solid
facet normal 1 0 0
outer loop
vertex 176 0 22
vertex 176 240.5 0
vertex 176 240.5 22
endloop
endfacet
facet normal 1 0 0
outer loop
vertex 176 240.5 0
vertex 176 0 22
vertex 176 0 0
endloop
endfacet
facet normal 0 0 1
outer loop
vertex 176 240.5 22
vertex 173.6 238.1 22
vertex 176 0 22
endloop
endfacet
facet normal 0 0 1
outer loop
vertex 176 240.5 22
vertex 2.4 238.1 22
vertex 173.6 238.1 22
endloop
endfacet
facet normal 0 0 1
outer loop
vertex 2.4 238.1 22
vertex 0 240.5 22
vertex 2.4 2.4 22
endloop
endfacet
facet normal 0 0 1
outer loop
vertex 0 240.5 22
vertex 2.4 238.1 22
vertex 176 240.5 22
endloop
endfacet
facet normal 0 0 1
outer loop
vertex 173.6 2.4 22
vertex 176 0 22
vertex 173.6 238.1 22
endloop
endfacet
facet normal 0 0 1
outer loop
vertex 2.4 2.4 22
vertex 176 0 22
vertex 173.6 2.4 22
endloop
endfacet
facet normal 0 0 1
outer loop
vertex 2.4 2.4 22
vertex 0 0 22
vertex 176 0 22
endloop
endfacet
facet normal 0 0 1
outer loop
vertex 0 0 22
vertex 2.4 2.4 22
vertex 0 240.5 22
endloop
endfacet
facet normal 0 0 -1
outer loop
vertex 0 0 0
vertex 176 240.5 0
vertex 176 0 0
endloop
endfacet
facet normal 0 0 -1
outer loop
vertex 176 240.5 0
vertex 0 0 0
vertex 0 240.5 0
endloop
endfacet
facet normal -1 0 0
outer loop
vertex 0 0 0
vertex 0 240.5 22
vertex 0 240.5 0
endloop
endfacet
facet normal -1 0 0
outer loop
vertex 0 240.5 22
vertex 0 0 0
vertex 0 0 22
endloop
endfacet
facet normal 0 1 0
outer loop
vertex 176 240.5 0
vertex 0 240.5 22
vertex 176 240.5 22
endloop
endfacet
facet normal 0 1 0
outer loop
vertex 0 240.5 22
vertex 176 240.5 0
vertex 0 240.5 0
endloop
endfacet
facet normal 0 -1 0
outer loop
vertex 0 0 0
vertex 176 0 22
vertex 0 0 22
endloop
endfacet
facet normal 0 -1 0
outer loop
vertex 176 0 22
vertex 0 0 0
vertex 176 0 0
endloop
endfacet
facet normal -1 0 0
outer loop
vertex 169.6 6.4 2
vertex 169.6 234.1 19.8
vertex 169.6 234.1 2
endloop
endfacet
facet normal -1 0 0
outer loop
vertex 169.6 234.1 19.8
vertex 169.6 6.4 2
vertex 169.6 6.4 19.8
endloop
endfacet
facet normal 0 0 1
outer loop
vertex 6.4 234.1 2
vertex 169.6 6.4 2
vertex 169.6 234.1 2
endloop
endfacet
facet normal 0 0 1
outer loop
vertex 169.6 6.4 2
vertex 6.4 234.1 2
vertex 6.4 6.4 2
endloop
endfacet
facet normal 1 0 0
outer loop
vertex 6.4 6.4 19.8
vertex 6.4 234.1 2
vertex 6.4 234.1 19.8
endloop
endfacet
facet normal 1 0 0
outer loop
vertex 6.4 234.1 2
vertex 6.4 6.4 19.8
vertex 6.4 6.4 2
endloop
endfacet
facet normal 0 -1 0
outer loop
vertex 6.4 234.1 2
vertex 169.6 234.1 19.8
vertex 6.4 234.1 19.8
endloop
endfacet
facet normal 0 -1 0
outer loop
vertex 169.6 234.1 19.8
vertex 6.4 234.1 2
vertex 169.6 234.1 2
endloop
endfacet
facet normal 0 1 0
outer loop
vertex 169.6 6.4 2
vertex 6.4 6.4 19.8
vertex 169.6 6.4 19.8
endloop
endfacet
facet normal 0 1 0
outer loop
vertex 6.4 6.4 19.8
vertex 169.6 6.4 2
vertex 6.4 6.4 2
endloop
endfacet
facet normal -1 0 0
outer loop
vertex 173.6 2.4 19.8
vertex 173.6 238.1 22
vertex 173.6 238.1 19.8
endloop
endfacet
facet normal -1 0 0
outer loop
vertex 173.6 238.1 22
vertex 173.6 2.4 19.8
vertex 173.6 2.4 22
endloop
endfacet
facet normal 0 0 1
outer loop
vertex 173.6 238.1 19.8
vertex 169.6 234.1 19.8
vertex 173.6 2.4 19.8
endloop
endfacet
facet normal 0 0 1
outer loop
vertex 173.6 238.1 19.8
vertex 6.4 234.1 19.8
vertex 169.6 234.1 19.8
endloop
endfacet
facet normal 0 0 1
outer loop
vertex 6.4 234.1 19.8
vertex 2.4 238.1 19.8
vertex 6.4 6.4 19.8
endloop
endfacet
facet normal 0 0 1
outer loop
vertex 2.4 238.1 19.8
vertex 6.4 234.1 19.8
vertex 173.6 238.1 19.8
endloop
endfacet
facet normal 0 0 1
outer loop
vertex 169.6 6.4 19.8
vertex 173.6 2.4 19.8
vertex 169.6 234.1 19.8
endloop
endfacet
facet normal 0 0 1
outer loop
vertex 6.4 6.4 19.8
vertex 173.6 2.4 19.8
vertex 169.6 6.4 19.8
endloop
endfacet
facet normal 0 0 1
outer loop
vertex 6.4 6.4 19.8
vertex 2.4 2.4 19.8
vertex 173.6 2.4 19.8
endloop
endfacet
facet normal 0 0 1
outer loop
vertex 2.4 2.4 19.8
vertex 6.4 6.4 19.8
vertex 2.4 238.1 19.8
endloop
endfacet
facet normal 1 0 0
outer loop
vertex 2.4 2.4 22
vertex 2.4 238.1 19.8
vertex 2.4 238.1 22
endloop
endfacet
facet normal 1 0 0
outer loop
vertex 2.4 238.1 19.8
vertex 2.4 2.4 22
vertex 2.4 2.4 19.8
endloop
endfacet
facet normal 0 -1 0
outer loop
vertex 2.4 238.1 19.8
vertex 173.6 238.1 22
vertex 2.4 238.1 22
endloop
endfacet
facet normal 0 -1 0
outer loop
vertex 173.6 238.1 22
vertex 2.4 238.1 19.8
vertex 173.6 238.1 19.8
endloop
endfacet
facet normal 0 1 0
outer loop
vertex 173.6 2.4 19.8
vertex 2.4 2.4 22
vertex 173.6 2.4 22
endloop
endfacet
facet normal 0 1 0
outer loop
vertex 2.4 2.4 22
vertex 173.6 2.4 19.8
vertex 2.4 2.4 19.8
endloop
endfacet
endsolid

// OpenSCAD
// Four, split for a 153.36 x 77.76 x 165 mm resin plate.
// The tray is FDM. Every other part fits in 150.9 x 75.3 mm.
// Tiles drop into a 2.2 mm rabbet. Glue them. Do not screw them.
//
//   openscad -D 'part="tray"' -o tray.stl four.scad
//
W = 176.0;
H = 240.5;
tray_h = 22.0;
wall = 2.4;
tile_t = 2.2;
part = "tray"; // [tray, fader-1, fader-2, fader-3, fader-4, master, transport-l, transport-r, ear-l, screen, ear-r]

module tile(x0, y0, x1, y1) {
  translate([x0, y0, tray_h - tile_t]) cube([x1 - x0, y1 - y0, tile_t]);
}

module faders_12() { tile(2.60, 2.60, 72.75, 145.75); }
module faders_34() { tile(73.25, 2.60, 136.75, 145.75); }
module master() { tile(137.25, 2.60, 173.40, 145.75); }
module transport_l() { tile(2.60, 146.25, 82.75, 165.25); }
module transport_r() { tile(83.25, 146.25, 173.40, 165.25); }
module screen() { tile(2.60, 165.75, 133.75, 237.90); }
module ear_r() { tile(134.25, 165.75, 173.40, 237.90); }

if (part == "tray") {
  difference() {
    cube([W, H, tray_h]);
    translate([wall + 4, wall + 4, 2]) cube([W - 2 * wall - 8, H - 2 * wall - 8, tray_h]);
    translate([wall, wall, tray_h - tile_t]) cube([W - 2 * wall, H - 2 * wall, tile_t + 1]);
  }
}
if (part == "faders-12") faders_12();
if (part == "faders-34") faders_34();
if (part == "master") master();
if (part == "transport-l") transport_l();
if (part == "transport-r") transport_r();
if (part == "screen") screen();
if (part == "ear-r") ear_r();
